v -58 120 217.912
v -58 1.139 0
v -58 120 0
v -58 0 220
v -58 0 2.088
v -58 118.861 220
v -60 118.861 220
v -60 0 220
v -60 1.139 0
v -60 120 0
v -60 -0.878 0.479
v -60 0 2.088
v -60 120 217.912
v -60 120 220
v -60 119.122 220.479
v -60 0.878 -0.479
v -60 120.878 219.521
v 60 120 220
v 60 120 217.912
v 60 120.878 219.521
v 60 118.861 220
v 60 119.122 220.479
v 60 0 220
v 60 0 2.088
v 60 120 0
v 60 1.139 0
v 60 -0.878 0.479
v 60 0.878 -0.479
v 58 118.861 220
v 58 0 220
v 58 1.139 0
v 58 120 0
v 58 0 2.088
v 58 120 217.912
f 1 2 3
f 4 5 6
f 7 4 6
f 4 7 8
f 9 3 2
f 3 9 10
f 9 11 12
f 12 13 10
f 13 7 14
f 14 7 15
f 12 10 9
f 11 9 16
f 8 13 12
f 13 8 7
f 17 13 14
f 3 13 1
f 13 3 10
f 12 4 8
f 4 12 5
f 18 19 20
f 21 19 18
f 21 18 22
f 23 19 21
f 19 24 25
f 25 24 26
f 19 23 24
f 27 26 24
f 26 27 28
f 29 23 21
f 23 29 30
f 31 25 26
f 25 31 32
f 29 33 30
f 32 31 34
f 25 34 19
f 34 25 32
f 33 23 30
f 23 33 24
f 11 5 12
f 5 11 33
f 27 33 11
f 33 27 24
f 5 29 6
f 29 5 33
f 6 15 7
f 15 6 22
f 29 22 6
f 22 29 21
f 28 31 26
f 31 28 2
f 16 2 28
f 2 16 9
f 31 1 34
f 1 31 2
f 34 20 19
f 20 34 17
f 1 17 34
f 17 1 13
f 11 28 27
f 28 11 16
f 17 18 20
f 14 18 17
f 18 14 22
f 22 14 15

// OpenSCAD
// Parameters
side_width_y = 120;         // Width of end plates in Y-direction (front-to-back, mm)
side_height_z = 220;       // Height of end plates in Z-direction (bottom-to-top, mm)
side_thickness_x = 2;      // Thickness of end plates in X-direction (left-to-right, mm)
spacing_x = 120;           // Distance between centers of end plates in X-direction (mm)
// Chord length of wing in Y-direction (front-to-back, mm)
wing_chord_y = sqrt(pow(side_width_y,2) + pow(side_height_z,2));  
wing_span_x = spacing_x;   // Span of wing in X-direction (left-to-right, mm)
wing_thickness_z = 2;      // Thickness of wing in Z-direction (mm)
wing_height_z = side_height_z / 2;  // Height where wing is mounted (mm from bottom)
wing_angle = atan(side_height_z / side_width_y);          // Angle of attack in degrees (negative for downforce)

// End plate left
translate([-spacing_x/2, 0, 0])
    cube([side_thickness_x, side_width_y, side_height_z]);

// End plate right
translate([spacing_x/2 - side_thickness_x, 0, 0])
    cube([side_thickness_x, side_width_y, side_height_z]);

// Wing (horizontal, spanning between end plates, with angle of attack)
translate([0, side_width_y/2, wing_height_z])
    rotate([wing_angle, 0, 0])
        cube([wing_span_x, wing_chord_y, wing_thickness_z], center=true);
